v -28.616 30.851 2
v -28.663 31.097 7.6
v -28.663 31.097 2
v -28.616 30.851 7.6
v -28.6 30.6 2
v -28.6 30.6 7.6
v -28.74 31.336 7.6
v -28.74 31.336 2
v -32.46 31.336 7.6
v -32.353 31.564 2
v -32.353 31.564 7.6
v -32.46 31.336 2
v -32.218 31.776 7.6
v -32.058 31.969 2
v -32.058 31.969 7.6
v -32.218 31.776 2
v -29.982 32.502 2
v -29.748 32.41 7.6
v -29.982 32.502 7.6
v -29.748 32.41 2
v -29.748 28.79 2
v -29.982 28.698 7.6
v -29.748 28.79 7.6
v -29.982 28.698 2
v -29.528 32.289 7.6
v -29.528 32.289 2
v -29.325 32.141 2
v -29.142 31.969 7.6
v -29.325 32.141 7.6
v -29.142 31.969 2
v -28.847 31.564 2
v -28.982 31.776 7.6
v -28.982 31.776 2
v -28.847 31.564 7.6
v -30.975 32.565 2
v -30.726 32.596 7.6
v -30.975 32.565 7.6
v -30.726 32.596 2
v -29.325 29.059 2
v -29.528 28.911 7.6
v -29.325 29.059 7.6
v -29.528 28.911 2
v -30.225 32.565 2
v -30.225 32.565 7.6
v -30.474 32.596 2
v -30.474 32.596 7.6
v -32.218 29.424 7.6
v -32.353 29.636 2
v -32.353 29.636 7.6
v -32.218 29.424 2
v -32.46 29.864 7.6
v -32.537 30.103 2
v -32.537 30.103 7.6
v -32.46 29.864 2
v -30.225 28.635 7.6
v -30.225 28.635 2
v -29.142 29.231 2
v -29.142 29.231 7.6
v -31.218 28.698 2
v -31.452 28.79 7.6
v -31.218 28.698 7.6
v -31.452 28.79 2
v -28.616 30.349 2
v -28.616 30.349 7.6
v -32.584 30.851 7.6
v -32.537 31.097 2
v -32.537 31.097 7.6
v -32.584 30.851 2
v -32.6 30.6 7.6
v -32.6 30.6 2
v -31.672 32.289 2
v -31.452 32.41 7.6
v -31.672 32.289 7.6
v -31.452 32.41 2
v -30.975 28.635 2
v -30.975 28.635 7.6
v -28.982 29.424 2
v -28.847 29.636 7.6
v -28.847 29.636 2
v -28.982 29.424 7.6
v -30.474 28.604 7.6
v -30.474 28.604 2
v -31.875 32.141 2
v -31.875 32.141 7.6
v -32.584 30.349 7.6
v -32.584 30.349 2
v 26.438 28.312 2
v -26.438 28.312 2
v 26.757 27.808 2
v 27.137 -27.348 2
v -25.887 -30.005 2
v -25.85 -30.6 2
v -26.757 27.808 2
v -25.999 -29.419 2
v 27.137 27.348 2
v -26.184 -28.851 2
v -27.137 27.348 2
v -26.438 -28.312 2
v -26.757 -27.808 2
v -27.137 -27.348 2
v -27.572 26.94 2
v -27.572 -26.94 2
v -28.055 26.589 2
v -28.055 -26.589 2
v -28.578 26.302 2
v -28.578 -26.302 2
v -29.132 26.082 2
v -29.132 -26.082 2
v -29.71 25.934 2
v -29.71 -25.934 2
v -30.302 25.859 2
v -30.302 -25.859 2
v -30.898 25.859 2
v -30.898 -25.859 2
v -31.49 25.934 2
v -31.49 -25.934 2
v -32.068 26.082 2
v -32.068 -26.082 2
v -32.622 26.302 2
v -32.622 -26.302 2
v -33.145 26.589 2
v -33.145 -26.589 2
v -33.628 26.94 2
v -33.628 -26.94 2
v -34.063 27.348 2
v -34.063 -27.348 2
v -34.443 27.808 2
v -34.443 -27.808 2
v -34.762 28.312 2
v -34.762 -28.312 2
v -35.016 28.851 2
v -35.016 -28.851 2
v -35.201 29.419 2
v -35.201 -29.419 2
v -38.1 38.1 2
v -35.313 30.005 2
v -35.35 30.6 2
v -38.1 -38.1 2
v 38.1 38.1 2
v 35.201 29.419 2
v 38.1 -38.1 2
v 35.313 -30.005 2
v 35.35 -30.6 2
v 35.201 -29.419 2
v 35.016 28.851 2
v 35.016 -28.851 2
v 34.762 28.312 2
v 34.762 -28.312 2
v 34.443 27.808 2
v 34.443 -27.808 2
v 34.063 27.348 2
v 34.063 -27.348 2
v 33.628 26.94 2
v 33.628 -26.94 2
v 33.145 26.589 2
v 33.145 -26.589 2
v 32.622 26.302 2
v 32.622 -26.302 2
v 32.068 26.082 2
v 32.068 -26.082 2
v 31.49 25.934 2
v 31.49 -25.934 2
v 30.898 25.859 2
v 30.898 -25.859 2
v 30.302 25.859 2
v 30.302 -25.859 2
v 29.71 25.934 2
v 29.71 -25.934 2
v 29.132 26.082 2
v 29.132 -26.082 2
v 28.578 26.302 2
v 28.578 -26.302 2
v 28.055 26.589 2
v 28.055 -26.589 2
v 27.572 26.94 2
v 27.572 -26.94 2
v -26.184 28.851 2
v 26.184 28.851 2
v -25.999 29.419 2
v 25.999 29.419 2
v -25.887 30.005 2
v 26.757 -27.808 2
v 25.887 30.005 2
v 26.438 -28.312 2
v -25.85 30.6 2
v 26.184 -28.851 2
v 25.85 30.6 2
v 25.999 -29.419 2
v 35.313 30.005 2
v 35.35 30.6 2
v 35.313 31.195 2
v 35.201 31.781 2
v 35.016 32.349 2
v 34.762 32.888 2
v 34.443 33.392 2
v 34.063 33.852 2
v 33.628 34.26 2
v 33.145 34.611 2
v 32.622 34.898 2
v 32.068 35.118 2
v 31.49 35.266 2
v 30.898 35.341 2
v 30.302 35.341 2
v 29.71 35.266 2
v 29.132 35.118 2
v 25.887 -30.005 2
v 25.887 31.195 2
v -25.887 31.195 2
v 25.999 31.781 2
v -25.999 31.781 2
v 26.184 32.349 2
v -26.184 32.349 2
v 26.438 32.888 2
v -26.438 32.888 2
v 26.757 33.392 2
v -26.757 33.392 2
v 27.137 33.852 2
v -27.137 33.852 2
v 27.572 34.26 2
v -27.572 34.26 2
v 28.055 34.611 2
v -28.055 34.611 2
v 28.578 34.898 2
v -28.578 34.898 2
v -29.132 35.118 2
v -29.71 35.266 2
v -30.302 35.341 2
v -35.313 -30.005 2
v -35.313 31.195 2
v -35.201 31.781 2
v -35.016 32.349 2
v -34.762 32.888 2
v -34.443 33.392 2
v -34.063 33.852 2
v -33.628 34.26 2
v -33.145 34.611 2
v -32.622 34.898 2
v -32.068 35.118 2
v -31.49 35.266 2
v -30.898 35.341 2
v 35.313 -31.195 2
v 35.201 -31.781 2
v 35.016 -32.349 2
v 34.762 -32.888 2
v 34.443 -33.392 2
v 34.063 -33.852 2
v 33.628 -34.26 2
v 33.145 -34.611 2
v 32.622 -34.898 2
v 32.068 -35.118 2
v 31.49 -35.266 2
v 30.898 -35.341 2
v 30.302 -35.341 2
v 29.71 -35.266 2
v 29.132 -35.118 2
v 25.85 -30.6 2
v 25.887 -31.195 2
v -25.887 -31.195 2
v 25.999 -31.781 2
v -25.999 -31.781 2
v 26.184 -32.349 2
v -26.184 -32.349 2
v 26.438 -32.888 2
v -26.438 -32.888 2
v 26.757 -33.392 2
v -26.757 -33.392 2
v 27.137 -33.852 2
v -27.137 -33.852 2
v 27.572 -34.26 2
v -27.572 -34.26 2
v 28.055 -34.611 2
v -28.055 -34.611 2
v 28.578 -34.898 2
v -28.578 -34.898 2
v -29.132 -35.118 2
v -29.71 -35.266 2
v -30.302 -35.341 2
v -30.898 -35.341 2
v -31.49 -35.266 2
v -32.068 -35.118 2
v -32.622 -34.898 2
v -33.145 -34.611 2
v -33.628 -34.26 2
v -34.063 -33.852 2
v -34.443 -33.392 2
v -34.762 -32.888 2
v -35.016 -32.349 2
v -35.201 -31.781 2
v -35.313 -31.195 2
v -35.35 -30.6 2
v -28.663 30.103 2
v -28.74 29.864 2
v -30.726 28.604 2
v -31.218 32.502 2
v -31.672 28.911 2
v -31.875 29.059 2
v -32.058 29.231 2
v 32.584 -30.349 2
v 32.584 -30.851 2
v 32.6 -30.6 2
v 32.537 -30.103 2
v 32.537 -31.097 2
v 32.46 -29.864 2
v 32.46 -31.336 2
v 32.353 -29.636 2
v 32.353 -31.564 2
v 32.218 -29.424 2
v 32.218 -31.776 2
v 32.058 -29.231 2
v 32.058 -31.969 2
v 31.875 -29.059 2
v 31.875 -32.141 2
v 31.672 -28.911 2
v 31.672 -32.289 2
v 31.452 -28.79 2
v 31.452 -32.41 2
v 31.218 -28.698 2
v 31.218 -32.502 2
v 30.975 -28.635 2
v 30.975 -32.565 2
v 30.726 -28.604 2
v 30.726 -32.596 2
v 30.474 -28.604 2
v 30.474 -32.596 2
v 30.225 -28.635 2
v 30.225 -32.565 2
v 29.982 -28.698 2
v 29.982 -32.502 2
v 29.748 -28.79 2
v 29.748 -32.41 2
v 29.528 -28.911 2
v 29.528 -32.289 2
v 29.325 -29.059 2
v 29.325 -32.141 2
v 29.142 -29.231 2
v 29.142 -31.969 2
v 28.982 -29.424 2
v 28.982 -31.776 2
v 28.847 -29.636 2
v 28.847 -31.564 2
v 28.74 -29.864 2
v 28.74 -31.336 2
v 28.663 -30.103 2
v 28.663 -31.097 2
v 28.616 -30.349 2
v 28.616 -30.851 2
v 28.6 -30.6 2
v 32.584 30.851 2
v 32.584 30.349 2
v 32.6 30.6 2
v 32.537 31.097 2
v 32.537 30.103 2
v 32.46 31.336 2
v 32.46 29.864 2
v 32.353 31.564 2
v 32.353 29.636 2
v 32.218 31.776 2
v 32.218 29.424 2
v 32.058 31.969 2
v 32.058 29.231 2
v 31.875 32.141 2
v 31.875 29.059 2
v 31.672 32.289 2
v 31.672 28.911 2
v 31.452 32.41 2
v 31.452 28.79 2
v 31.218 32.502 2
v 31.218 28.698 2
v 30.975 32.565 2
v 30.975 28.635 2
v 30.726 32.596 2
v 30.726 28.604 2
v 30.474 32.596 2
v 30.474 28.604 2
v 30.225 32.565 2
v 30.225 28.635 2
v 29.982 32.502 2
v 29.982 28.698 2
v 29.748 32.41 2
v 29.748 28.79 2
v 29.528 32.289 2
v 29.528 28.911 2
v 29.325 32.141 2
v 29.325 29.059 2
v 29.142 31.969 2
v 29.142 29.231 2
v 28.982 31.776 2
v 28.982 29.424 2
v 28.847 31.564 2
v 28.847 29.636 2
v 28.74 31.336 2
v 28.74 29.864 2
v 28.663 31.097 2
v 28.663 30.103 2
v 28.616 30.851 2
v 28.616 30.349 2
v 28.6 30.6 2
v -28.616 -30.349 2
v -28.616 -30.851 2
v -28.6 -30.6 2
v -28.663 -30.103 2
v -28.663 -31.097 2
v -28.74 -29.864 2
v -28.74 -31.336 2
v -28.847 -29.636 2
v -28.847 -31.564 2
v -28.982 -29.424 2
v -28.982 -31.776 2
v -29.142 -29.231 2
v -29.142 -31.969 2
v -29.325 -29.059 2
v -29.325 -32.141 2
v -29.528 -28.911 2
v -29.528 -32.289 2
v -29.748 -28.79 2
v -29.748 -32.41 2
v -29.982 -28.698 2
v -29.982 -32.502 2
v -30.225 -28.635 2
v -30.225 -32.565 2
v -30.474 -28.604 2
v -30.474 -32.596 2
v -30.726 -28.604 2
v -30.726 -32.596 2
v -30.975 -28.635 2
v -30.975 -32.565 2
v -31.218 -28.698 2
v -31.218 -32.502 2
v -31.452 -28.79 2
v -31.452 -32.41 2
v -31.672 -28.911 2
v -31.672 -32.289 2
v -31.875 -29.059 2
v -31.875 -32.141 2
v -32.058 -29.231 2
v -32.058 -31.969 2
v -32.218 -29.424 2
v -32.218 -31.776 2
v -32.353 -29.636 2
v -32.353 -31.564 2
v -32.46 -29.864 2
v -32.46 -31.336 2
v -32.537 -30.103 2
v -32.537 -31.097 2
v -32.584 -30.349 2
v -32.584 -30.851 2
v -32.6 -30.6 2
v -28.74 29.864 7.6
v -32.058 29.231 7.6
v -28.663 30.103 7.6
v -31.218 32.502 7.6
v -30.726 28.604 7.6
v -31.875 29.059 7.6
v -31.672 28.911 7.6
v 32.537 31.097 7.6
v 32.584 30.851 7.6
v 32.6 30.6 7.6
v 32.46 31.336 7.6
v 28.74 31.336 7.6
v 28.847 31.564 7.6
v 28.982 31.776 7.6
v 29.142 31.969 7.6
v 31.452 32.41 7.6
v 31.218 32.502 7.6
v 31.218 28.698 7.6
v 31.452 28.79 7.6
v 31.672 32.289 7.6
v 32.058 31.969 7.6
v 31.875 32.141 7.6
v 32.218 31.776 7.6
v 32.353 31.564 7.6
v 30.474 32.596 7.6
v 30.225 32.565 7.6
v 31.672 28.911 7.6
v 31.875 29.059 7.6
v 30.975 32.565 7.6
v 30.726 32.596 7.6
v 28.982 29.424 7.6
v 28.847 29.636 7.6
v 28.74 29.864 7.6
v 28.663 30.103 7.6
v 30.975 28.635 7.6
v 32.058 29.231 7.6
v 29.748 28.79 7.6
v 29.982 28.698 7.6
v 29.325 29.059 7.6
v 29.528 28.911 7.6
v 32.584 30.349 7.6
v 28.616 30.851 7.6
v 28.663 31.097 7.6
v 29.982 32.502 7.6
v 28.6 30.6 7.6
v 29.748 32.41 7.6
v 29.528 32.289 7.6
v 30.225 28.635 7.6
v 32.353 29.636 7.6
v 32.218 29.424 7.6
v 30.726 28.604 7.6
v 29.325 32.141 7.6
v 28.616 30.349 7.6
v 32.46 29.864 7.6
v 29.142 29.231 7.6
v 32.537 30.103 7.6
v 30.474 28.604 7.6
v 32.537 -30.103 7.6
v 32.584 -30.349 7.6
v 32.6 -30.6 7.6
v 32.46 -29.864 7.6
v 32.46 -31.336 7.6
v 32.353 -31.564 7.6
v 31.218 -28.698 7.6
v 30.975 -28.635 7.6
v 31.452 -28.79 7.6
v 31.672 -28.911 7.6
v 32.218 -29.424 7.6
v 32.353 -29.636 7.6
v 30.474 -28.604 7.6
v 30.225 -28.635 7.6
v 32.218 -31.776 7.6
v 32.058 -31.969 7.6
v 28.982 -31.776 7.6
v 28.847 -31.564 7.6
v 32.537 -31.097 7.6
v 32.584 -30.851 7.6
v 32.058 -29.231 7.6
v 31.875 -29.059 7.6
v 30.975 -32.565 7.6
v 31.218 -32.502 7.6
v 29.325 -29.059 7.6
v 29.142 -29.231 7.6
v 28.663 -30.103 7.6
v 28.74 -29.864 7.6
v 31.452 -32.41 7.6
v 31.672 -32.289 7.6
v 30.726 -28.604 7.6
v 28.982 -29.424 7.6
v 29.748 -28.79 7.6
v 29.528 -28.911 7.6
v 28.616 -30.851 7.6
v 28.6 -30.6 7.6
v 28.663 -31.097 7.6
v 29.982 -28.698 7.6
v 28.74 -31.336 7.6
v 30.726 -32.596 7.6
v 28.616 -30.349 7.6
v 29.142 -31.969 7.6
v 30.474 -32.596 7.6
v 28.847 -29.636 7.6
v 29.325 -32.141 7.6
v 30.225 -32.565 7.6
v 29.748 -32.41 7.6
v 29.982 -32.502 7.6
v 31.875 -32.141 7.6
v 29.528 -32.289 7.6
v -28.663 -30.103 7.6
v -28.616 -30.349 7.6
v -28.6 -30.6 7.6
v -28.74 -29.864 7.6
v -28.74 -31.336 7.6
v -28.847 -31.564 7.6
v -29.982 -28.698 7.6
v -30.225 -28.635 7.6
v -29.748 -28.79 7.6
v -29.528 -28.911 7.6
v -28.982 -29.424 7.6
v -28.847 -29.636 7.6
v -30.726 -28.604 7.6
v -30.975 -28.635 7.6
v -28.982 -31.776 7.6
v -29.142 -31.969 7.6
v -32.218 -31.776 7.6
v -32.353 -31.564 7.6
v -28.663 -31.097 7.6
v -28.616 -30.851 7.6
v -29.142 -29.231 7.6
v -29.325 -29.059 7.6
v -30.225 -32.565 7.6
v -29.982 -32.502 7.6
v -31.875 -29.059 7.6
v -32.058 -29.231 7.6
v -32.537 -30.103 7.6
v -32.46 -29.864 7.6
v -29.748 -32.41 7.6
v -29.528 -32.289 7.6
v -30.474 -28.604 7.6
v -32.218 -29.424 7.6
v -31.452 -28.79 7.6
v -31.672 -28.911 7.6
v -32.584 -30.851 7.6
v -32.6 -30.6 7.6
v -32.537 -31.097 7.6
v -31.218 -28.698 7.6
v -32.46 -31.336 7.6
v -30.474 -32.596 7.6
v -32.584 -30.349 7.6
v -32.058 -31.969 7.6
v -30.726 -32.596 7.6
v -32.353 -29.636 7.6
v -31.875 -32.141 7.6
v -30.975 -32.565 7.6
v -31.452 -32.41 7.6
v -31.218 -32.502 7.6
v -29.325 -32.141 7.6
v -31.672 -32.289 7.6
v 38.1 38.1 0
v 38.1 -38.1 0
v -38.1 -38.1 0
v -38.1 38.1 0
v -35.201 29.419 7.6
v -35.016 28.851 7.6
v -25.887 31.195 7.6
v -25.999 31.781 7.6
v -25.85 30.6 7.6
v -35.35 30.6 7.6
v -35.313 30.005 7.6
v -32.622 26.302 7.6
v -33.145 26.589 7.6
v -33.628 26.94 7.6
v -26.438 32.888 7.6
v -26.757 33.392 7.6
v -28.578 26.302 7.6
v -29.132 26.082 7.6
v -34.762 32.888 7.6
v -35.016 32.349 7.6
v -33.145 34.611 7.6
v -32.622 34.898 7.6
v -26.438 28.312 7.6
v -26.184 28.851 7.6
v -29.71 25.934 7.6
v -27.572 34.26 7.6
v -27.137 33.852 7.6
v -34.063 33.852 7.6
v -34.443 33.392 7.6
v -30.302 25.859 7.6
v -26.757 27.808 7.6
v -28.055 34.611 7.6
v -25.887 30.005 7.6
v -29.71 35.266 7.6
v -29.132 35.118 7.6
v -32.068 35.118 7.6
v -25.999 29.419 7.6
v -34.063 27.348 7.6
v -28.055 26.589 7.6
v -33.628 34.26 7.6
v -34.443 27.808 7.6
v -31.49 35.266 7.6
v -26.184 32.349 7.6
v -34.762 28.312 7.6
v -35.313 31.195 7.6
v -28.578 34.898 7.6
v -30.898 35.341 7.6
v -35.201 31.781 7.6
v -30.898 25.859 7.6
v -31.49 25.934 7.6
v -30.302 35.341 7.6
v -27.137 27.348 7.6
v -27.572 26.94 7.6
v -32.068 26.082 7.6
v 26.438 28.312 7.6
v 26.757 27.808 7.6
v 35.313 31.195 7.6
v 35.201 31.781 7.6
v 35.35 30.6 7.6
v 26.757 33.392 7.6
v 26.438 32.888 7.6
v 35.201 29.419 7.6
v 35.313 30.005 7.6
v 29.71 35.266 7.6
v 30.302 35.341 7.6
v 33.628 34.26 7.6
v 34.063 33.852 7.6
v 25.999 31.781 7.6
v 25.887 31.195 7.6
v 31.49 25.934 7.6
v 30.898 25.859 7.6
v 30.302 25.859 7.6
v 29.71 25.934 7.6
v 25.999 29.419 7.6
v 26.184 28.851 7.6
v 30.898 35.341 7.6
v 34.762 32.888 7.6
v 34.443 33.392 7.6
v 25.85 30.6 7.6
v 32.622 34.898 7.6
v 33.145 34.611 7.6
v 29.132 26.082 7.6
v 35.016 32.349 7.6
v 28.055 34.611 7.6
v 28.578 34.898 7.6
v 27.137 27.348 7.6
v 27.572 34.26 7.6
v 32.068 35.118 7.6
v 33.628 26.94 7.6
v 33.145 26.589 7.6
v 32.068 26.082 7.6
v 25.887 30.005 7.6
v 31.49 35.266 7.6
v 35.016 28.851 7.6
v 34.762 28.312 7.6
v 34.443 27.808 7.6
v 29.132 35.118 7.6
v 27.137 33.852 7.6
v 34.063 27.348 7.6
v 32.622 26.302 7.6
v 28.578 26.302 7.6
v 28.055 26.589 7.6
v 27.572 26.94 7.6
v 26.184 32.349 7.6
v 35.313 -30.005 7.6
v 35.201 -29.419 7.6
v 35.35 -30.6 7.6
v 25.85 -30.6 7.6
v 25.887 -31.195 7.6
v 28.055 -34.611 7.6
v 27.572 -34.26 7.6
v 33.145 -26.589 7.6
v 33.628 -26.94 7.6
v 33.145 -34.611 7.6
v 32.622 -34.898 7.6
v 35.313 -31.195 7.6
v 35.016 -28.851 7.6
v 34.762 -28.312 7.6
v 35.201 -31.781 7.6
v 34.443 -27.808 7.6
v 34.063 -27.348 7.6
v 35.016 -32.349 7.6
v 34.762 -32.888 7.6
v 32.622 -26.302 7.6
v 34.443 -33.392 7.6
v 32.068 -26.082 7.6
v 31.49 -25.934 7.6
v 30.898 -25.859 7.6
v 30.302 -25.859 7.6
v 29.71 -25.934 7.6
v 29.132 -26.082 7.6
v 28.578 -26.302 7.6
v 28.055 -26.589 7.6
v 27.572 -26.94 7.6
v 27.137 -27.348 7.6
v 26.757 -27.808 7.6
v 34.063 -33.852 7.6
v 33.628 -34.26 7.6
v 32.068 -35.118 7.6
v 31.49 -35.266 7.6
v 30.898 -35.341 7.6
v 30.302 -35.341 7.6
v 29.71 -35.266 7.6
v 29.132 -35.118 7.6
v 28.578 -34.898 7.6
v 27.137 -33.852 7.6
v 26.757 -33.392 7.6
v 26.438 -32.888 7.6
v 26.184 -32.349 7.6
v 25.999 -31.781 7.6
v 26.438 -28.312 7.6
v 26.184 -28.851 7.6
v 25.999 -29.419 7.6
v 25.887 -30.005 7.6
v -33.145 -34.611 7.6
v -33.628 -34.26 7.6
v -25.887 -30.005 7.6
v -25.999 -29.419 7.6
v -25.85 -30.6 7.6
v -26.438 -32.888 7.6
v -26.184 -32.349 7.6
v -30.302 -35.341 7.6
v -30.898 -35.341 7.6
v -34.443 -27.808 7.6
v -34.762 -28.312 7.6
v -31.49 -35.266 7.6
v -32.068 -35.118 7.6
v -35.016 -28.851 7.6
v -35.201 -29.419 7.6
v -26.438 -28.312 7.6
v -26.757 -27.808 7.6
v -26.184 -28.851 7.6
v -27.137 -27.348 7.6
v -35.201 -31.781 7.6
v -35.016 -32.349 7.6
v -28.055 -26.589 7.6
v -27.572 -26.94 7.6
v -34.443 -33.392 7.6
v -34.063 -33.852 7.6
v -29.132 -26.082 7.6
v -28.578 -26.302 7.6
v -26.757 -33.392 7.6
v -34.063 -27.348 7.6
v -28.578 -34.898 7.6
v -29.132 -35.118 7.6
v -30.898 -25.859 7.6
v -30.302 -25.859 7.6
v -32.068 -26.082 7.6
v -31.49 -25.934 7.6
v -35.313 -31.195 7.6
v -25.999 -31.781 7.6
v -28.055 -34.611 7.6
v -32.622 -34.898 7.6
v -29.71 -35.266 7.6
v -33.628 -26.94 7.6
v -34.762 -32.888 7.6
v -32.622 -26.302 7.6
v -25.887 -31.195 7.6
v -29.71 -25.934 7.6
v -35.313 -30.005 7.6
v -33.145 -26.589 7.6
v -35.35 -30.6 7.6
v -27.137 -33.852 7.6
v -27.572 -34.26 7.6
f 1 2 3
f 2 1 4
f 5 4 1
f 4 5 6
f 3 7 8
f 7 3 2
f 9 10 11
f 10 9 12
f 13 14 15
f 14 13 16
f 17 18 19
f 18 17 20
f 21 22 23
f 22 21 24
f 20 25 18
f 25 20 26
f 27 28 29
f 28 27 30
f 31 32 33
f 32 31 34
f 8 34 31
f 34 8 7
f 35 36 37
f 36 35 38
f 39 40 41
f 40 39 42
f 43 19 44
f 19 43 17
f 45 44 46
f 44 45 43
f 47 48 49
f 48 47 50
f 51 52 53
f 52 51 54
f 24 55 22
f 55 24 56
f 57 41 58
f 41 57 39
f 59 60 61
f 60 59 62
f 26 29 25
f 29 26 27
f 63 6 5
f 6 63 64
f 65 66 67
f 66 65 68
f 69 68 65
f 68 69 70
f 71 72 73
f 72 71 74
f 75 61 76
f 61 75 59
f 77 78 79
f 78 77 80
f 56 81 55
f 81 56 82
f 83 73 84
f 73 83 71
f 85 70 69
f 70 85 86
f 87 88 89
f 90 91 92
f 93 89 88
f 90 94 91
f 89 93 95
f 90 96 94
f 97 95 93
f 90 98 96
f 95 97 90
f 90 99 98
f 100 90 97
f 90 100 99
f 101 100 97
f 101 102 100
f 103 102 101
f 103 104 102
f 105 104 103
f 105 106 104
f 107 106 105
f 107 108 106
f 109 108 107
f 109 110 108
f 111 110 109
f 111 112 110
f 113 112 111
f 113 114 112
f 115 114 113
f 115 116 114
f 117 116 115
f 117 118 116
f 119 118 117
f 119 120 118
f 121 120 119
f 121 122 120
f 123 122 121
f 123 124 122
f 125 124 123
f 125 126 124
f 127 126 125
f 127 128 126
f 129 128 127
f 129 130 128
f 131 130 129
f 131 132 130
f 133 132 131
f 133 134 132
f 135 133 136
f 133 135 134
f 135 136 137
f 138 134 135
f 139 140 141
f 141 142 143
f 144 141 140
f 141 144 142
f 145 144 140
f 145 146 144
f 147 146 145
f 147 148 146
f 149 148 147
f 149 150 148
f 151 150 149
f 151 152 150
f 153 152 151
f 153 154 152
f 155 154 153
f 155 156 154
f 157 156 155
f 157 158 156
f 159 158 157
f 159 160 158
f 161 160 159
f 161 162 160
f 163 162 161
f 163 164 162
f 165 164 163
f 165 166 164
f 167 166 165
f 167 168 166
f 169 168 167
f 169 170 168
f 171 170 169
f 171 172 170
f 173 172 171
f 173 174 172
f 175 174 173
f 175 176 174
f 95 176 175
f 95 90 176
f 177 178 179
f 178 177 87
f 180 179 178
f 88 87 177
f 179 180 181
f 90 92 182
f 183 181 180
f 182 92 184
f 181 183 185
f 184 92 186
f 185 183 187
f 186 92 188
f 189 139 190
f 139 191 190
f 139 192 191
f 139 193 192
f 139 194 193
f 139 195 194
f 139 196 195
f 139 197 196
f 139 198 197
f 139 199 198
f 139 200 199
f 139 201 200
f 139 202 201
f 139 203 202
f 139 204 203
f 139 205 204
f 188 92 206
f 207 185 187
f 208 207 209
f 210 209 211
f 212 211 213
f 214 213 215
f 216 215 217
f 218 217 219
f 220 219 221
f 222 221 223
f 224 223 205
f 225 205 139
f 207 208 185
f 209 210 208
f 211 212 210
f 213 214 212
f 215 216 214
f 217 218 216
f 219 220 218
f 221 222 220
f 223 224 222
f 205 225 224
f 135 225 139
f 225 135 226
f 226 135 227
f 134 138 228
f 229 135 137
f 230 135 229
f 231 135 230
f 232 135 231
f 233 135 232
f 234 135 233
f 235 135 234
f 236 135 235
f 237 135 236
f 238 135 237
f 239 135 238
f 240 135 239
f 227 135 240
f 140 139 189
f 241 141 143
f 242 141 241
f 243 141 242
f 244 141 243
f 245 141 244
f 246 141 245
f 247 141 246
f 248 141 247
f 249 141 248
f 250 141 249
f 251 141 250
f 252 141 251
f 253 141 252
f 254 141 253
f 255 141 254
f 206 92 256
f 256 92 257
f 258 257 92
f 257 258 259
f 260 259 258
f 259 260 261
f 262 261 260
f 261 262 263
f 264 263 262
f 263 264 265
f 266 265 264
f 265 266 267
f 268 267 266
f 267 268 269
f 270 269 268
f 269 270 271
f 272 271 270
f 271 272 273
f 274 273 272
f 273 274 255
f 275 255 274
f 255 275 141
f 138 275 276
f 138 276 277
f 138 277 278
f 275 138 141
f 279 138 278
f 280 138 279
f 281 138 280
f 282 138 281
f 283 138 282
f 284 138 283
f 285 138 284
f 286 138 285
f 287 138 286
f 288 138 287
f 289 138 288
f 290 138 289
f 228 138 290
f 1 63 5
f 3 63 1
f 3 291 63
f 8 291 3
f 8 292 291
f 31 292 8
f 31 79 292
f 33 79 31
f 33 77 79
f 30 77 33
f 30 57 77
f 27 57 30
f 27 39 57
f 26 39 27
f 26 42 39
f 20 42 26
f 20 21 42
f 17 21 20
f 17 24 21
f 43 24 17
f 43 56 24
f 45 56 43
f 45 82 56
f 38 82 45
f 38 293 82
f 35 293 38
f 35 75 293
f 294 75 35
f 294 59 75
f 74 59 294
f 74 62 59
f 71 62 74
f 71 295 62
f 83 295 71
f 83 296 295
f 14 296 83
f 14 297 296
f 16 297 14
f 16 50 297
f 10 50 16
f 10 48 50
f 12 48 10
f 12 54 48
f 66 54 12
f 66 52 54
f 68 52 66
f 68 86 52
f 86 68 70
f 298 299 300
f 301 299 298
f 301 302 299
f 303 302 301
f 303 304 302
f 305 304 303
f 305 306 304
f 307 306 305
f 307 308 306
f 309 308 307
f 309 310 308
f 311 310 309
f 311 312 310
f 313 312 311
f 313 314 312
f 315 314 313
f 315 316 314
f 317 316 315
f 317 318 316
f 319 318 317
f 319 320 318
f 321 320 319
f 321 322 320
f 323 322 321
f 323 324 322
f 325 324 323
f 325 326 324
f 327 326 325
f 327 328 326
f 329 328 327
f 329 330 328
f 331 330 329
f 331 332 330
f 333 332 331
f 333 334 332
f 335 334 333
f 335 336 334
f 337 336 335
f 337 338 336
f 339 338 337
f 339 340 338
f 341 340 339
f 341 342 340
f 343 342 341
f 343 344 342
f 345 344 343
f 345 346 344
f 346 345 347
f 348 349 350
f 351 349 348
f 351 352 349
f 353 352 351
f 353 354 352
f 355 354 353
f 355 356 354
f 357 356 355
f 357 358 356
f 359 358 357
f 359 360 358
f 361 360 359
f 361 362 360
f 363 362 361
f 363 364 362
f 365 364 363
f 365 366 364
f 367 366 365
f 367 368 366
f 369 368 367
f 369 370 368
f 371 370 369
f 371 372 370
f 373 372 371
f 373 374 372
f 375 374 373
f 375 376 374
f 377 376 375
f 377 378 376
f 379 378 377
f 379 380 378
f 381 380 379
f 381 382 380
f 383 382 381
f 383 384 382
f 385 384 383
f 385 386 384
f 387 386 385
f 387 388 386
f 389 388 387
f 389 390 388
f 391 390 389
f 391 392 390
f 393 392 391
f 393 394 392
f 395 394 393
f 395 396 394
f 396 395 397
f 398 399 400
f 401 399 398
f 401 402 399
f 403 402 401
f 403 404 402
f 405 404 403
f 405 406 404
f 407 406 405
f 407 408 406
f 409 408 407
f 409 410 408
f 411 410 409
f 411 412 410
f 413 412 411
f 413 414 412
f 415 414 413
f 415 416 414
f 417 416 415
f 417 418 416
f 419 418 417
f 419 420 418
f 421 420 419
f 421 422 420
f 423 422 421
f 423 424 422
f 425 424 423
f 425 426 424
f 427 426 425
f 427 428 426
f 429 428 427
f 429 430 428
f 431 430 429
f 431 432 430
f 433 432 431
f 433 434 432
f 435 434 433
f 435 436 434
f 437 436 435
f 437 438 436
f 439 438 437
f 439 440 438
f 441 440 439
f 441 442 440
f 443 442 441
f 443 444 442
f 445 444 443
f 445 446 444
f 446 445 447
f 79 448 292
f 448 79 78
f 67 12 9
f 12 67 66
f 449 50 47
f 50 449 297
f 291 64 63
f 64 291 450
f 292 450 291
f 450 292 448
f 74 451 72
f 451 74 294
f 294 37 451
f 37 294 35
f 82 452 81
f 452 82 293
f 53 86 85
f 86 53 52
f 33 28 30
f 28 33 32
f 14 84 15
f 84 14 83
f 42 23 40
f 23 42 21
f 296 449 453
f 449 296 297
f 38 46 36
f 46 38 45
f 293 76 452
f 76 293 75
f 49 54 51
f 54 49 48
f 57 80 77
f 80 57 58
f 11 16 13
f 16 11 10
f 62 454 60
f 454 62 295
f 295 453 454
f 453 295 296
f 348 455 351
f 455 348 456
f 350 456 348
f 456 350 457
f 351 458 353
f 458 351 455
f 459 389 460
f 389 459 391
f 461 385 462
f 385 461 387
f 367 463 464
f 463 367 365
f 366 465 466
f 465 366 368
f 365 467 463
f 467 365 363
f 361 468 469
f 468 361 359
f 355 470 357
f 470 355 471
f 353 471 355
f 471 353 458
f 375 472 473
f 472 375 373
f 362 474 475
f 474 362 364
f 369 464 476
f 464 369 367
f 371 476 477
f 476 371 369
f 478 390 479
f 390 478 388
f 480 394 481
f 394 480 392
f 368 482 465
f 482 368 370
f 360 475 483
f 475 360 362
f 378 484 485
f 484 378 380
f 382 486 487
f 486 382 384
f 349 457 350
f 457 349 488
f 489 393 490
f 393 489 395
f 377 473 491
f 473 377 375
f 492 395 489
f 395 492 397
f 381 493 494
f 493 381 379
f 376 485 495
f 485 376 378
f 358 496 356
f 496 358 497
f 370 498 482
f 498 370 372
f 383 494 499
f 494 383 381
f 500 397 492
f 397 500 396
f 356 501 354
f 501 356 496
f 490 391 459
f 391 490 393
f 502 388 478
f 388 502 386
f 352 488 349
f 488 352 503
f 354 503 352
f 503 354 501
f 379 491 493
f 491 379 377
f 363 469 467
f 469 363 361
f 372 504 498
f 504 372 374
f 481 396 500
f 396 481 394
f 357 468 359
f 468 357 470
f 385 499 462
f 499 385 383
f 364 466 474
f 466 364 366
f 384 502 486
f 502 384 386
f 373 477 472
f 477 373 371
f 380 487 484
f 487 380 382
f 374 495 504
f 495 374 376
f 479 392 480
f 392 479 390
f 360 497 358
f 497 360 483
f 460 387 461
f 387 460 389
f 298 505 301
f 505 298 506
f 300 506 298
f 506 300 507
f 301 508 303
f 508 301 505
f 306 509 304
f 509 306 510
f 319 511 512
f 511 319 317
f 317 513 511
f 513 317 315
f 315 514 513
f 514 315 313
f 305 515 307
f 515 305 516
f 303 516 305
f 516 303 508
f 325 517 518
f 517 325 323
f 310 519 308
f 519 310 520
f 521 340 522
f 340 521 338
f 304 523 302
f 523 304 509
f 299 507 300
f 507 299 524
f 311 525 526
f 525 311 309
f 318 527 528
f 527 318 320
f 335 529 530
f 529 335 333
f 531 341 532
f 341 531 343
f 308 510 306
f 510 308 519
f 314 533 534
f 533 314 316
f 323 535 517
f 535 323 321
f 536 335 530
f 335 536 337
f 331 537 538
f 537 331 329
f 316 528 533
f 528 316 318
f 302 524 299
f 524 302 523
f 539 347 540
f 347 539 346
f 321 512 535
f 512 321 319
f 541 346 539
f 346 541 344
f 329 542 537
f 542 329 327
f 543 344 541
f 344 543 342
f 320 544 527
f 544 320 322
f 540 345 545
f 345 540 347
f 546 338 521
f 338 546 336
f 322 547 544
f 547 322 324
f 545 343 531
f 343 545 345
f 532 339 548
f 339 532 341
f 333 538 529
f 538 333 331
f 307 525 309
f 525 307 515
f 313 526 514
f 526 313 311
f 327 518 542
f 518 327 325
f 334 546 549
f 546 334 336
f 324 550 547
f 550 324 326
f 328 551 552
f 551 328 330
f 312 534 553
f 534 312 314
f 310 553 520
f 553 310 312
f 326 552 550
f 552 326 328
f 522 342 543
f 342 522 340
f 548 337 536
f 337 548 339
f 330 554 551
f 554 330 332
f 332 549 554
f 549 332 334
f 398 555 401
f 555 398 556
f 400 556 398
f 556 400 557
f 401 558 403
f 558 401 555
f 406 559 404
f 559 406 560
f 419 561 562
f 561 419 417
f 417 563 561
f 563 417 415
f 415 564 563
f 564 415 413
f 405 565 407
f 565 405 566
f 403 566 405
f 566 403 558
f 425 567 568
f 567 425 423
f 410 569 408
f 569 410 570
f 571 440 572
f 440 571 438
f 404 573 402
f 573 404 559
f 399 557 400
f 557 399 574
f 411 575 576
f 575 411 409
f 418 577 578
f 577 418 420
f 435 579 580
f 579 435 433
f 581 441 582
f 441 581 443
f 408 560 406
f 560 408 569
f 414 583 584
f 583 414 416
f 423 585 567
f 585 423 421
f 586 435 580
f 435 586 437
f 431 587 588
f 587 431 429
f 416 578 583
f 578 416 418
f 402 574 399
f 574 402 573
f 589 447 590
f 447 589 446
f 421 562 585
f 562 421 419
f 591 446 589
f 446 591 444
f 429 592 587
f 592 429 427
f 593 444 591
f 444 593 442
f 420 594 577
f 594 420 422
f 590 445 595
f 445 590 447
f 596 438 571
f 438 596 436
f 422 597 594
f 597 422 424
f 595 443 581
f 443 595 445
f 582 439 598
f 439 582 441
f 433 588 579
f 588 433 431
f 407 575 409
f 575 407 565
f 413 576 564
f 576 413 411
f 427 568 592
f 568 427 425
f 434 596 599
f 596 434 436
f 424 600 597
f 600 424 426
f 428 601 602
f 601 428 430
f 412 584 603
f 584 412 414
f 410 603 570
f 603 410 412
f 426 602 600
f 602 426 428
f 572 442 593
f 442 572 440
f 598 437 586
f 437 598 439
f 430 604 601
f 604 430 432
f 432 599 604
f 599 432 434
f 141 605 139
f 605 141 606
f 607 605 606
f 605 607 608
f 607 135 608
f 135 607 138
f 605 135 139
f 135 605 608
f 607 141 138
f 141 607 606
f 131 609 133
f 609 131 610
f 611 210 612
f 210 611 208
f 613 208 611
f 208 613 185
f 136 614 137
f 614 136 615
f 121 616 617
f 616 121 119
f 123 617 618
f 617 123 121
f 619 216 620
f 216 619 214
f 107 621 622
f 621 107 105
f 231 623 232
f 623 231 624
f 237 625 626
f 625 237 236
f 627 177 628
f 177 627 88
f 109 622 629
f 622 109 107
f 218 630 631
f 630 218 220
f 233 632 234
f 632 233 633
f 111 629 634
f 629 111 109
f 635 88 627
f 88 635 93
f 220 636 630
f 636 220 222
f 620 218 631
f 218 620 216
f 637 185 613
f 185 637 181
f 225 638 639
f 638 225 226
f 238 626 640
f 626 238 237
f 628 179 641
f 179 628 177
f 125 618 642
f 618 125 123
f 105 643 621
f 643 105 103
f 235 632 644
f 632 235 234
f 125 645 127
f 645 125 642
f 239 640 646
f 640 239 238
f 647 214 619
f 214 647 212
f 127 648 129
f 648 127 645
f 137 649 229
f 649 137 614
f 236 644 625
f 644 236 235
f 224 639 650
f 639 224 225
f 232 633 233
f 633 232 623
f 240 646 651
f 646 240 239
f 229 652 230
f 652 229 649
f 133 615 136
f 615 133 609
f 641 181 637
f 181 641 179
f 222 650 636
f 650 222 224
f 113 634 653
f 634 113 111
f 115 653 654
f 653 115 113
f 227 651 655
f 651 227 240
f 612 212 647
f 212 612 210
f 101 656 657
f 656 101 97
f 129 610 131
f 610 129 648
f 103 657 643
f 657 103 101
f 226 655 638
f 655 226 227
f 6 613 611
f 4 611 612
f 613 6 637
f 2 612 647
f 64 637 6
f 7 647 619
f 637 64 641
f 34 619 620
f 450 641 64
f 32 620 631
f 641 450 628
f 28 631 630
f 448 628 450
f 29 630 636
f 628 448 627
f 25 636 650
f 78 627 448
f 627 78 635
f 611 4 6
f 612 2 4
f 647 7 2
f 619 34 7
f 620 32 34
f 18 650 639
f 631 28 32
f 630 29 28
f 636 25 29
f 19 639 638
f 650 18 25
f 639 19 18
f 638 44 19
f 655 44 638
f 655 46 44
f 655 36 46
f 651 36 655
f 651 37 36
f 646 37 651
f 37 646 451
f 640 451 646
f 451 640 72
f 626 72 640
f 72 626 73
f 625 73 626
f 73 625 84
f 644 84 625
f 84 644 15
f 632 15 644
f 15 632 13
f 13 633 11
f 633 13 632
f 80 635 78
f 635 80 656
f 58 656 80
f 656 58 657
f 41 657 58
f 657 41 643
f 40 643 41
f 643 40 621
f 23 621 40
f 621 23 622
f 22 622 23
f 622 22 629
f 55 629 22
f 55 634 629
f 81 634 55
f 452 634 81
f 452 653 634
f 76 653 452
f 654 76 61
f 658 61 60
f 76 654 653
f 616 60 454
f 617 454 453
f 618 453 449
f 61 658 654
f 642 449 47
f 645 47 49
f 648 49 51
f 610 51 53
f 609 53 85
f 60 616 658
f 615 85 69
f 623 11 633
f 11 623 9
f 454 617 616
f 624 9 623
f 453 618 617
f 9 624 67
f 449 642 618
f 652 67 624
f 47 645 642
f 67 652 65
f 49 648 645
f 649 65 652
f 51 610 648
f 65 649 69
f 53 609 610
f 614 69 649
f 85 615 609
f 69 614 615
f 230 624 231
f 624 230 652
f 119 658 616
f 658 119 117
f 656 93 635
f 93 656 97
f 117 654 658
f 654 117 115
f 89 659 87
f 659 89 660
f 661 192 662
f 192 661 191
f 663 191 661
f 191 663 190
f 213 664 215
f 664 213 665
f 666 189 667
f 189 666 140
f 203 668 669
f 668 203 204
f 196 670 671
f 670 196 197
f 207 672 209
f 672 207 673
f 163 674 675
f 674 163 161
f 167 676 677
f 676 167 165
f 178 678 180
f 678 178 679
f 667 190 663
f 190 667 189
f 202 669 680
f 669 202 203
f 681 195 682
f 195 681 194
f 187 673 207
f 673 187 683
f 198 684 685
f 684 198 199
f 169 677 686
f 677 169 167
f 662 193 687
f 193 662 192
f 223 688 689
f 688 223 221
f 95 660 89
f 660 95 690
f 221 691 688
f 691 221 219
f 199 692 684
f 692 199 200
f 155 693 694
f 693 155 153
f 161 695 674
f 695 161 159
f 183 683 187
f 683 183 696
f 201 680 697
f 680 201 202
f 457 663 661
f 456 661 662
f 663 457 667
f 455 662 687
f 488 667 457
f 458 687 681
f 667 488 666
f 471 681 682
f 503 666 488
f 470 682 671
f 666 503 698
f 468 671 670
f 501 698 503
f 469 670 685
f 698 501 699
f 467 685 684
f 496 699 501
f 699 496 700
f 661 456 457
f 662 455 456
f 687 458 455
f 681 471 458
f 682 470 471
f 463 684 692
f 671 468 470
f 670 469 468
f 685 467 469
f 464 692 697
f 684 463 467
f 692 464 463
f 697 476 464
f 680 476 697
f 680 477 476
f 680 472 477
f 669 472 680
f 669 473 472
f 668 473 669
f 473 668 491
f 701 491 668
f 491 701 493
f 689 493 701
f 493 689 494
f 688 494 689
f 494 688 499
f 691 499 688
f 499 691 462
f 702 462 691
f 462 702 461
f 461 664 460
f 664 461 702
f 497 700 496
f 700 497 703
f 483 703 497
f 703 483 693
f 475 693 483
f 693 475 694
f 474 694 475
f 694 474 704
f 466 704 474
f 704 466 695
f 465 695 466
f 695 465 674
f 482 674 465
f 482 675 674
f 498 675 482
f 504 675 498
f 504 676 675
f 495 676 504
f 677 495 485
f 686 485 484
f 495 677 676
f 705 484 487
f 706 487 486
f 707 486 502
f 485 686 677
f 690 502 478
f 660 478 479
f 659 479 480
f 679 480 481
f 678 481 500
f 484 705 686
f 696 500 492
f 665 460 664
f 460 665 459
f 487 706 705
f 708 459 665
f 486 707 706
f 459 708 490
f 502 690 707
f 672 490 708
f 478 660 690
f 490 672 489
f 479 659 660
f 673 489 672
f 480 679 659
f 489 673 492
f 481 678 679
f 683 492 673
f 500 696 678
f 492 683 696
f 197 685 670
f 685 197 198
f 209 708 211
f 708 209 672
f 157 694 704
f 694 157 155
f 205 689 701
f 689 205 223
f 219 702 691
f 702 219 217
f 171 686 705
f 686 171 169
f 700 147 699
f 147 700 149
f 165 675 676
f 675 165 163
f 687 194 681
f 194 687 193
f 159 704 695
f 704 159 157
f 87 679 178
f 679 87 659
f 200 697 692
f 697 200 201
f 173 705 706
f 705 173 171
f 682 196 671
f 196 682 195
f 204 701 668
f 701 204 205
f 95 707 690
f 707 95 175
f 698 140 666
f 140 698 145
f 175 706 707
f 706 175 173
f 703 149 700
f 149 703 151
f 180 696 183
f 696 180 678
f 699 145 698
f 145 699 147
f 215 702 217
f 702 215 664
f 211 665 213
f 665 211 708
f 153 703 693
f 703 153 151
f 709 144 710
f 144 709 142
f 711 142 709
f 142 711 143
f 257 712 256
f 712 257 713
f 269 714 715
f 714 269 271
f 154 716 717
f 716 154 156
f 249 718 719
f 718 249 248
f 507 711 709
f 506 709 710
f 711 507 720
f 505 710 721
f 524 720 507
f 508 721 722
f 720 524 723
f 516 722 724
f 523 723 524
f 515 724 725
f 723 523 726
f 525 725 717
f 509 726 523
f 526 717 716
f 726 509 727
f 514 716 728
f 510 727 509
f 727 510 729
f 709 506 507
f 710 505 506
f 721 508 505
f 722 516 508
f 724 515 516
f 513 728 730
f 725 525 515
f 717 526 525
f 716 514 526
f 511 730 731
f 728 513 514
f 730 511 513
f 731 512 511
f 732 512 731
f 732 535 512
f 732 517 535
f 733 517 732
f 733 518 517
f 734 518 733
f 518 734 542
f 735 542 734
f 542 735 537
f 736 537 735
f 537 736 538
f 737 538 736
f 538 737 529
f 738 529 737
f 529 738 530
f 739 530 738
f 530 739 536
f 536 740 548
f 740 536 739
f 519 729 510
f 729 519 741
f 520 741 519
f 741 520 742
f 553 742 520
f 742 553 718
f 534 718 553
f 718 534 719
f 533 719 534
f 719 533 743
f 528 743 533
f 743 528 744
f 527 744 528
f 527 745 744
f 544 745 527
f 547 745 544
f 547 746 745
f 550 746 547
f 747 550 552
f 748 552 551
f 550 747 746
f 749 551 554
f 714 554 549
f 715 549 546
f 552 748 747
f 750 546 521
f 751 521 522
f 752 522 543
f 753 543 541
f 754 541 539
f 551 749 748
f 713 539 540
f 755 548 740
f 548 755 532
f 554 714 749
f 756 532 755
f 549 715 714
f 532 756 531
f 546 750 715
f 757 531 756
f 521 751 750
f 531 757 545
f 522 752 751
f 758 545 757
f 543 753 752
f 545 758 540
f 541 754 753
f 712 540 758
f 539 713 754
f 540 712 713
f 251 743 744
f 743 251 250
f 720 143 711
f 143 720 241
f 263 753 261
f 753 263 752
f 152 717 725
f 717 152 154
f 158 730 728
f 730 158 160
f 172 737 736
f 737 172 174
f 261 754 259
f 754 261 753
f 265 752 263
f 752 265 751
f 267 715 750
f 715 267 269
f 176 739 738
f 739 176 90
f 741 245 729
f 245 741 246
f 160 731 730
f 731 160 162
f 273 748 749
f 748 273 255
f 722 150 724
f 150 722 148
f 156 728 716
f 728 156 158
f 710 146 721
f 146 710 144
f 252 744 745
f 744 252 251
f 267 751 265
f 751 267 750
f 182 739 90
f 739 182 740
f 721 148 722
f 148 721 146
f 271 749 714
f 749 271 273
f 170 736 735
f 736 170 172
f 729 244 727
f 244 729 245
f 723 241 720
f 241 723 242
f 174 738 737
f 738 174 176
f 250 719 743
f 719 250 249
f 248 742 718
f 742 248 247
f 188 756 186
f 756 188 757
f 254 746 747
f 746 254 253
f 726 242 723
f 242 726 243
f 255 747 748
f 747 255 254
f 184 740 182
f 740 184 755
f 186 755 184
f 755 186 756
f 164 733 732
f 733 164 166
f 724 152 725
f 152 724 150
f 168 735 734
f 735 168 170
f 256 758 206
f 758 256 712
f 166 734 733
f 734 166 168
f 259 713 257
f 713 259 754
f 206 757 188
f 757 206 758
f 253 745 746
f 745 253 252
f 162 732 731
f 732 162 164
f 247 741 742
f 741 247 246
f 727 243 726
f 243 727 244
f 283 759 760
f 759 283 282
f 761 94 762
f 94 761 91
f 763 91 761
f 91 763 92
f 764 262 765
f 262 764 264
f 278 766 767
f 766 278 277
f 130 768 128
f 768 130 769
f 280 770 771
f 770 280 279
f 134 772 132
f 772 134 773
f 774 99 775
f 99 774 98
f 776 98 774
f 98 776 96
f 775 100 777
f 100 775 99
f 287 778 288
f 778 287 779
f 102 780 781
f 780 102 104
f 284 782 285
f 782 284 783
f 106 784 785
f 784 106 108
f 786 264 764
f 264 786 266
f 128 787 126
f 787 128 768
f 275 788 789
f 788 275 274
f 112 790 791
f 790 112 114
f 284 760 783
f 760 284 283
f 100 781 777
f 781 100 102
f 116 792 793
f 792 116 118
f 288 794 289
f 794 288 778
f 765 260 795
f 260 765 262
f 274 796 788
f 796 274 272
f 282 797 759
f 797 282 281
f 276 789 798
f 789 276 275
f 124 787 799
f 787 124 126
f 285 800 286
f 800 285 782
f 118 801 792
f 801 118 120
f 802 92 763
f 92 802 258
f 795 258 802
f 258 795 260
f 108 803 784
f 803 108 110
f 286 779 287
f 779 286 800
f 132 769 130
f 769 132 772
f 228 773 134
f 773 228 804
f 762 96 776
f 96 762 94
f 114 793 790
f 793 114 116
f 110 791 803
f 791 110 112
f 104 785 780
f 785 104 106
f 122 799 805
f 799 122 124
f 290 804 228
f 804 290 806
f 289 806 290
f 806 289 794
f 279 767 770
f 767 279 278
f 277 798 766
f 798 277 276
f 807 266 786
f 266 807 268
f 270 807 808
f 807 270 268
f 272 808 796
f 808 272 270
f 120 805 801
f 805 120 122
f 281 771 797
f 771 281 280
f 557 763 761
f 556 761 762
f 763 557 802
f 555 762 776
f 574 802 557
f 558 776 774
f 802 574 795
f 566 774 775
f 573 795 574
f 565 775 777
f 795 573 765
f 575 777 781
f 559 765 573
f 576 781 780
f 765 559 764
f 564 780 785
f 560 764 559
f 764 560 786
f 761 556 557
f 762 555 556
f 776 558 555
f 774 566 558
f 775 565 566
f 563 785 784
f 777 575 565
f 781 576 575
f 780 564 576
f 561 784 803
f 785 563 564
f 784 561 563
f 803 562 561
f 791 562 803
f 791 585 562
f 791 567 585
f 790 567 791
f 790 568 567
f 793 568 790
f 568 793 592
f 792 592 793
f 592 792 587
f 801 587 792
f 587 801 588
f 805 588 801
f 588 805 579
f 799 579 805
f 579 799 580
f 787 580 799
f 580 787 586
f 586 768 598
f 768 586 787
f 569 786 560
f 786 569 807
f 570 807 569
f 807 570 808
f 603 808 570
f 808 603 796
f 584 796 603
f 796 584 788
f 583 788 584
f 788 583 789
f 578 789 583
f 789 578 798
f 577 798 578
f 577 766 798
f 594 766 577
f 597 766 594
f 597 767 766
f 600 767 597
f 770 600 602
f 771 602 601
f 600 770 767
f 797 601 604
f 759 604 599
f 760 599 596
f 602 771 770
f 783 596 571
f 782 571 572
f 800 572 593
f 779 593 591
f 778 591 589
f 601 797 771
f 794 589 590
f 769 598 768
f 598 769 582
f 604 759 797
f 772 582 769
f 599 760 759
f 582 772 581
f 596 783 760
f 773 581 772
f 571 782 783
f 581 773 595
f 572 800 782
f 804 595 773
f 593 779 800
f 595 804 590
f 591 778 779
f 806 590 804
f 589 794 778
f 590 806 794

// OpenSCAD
/* [Export] */

grid_size=0; //[0:3x3 inches,1:6x3 inches,2:6x6 inches]

/* [Hidden] */

$fn = 50;

grid_width = grid_size == 0 ? 76.2 : 152.4;
grid_length = grid_size == 2 ? 152.4 : 76.2;
grid_thickness = 2.0;

heat_sink_diameter = 4.;
heat_sink_height = 5.6;

screw_mount_diameter = 9.5;
screw_mount_height = heat_sink_height;

screw_hole_edge_offset = 7.5;
screw_hole_cylinder_height = screw_mount_height + grid_thickness + 0;


module panel() {
	translate([-grid_width/2, -grid_length/2, 0]) {
		cube([grid_width, grid_length, grid_thickness]);
	}
}

module screw_hole() {
	translate([0, 0, grid_thickness]) {
		color("red")
		cylinder(screw_hole_cylinder_height, d=heat_sink_diameter, center=false);
	}
}

module screw_mount() {
	translate([0, 0, grid_thickness]) {
		color("blue")
		cylinder(screw_mount_height, d=screw_mount_diameter, center=false);
	}	
}

module screw_mounts() {
	translate([-grid_width/2 + screw_hole_edge_offset, grid_length/2 - screw_hole_edge_offset, 0])
		screw_mount();

	translate([grid_width/2 - screw_hole_edge_offset, grid_length/2 - screw_hole_edge_offset, 0])
		screw_mount();

	translate([grid_width/2 - screw_hole_edge_offset, -grid_length/2 + screw_hole_edge_offset, 0])
		screw_mount();

	translate([-grid_width/2 + screw_hole_edge_offset, -grid_length/2 + screw_hole_edge_offset, 0])
		screw_mount();	
}

module screw_holes() {
	translate([-grid_width/2 + screw_hole_edge_offset, grid_length/2 - screw_hole_edge_offset, 0])
		screw_hole();

	translate([grid_width/2 - screw_hole_edge_offset, grid_length/2 - screw_hole_edge_offset, 0])
		screw_hole();

	translate([grid_width/2 - screw_hole_edge_offset, -grid_length/2 + screw_hole_edge_offset, 0])
		screw_hole();

	translate([-grid_width/2 + screw_hole_edge_offset, -grid_length/2 + screw_hole_edge_offset, 0])
		screw_hole();		
}



difference()
{
	panel();
	screw_holes();
}

difference() 
{
	screw_mounts();
	screw_holes();
}
